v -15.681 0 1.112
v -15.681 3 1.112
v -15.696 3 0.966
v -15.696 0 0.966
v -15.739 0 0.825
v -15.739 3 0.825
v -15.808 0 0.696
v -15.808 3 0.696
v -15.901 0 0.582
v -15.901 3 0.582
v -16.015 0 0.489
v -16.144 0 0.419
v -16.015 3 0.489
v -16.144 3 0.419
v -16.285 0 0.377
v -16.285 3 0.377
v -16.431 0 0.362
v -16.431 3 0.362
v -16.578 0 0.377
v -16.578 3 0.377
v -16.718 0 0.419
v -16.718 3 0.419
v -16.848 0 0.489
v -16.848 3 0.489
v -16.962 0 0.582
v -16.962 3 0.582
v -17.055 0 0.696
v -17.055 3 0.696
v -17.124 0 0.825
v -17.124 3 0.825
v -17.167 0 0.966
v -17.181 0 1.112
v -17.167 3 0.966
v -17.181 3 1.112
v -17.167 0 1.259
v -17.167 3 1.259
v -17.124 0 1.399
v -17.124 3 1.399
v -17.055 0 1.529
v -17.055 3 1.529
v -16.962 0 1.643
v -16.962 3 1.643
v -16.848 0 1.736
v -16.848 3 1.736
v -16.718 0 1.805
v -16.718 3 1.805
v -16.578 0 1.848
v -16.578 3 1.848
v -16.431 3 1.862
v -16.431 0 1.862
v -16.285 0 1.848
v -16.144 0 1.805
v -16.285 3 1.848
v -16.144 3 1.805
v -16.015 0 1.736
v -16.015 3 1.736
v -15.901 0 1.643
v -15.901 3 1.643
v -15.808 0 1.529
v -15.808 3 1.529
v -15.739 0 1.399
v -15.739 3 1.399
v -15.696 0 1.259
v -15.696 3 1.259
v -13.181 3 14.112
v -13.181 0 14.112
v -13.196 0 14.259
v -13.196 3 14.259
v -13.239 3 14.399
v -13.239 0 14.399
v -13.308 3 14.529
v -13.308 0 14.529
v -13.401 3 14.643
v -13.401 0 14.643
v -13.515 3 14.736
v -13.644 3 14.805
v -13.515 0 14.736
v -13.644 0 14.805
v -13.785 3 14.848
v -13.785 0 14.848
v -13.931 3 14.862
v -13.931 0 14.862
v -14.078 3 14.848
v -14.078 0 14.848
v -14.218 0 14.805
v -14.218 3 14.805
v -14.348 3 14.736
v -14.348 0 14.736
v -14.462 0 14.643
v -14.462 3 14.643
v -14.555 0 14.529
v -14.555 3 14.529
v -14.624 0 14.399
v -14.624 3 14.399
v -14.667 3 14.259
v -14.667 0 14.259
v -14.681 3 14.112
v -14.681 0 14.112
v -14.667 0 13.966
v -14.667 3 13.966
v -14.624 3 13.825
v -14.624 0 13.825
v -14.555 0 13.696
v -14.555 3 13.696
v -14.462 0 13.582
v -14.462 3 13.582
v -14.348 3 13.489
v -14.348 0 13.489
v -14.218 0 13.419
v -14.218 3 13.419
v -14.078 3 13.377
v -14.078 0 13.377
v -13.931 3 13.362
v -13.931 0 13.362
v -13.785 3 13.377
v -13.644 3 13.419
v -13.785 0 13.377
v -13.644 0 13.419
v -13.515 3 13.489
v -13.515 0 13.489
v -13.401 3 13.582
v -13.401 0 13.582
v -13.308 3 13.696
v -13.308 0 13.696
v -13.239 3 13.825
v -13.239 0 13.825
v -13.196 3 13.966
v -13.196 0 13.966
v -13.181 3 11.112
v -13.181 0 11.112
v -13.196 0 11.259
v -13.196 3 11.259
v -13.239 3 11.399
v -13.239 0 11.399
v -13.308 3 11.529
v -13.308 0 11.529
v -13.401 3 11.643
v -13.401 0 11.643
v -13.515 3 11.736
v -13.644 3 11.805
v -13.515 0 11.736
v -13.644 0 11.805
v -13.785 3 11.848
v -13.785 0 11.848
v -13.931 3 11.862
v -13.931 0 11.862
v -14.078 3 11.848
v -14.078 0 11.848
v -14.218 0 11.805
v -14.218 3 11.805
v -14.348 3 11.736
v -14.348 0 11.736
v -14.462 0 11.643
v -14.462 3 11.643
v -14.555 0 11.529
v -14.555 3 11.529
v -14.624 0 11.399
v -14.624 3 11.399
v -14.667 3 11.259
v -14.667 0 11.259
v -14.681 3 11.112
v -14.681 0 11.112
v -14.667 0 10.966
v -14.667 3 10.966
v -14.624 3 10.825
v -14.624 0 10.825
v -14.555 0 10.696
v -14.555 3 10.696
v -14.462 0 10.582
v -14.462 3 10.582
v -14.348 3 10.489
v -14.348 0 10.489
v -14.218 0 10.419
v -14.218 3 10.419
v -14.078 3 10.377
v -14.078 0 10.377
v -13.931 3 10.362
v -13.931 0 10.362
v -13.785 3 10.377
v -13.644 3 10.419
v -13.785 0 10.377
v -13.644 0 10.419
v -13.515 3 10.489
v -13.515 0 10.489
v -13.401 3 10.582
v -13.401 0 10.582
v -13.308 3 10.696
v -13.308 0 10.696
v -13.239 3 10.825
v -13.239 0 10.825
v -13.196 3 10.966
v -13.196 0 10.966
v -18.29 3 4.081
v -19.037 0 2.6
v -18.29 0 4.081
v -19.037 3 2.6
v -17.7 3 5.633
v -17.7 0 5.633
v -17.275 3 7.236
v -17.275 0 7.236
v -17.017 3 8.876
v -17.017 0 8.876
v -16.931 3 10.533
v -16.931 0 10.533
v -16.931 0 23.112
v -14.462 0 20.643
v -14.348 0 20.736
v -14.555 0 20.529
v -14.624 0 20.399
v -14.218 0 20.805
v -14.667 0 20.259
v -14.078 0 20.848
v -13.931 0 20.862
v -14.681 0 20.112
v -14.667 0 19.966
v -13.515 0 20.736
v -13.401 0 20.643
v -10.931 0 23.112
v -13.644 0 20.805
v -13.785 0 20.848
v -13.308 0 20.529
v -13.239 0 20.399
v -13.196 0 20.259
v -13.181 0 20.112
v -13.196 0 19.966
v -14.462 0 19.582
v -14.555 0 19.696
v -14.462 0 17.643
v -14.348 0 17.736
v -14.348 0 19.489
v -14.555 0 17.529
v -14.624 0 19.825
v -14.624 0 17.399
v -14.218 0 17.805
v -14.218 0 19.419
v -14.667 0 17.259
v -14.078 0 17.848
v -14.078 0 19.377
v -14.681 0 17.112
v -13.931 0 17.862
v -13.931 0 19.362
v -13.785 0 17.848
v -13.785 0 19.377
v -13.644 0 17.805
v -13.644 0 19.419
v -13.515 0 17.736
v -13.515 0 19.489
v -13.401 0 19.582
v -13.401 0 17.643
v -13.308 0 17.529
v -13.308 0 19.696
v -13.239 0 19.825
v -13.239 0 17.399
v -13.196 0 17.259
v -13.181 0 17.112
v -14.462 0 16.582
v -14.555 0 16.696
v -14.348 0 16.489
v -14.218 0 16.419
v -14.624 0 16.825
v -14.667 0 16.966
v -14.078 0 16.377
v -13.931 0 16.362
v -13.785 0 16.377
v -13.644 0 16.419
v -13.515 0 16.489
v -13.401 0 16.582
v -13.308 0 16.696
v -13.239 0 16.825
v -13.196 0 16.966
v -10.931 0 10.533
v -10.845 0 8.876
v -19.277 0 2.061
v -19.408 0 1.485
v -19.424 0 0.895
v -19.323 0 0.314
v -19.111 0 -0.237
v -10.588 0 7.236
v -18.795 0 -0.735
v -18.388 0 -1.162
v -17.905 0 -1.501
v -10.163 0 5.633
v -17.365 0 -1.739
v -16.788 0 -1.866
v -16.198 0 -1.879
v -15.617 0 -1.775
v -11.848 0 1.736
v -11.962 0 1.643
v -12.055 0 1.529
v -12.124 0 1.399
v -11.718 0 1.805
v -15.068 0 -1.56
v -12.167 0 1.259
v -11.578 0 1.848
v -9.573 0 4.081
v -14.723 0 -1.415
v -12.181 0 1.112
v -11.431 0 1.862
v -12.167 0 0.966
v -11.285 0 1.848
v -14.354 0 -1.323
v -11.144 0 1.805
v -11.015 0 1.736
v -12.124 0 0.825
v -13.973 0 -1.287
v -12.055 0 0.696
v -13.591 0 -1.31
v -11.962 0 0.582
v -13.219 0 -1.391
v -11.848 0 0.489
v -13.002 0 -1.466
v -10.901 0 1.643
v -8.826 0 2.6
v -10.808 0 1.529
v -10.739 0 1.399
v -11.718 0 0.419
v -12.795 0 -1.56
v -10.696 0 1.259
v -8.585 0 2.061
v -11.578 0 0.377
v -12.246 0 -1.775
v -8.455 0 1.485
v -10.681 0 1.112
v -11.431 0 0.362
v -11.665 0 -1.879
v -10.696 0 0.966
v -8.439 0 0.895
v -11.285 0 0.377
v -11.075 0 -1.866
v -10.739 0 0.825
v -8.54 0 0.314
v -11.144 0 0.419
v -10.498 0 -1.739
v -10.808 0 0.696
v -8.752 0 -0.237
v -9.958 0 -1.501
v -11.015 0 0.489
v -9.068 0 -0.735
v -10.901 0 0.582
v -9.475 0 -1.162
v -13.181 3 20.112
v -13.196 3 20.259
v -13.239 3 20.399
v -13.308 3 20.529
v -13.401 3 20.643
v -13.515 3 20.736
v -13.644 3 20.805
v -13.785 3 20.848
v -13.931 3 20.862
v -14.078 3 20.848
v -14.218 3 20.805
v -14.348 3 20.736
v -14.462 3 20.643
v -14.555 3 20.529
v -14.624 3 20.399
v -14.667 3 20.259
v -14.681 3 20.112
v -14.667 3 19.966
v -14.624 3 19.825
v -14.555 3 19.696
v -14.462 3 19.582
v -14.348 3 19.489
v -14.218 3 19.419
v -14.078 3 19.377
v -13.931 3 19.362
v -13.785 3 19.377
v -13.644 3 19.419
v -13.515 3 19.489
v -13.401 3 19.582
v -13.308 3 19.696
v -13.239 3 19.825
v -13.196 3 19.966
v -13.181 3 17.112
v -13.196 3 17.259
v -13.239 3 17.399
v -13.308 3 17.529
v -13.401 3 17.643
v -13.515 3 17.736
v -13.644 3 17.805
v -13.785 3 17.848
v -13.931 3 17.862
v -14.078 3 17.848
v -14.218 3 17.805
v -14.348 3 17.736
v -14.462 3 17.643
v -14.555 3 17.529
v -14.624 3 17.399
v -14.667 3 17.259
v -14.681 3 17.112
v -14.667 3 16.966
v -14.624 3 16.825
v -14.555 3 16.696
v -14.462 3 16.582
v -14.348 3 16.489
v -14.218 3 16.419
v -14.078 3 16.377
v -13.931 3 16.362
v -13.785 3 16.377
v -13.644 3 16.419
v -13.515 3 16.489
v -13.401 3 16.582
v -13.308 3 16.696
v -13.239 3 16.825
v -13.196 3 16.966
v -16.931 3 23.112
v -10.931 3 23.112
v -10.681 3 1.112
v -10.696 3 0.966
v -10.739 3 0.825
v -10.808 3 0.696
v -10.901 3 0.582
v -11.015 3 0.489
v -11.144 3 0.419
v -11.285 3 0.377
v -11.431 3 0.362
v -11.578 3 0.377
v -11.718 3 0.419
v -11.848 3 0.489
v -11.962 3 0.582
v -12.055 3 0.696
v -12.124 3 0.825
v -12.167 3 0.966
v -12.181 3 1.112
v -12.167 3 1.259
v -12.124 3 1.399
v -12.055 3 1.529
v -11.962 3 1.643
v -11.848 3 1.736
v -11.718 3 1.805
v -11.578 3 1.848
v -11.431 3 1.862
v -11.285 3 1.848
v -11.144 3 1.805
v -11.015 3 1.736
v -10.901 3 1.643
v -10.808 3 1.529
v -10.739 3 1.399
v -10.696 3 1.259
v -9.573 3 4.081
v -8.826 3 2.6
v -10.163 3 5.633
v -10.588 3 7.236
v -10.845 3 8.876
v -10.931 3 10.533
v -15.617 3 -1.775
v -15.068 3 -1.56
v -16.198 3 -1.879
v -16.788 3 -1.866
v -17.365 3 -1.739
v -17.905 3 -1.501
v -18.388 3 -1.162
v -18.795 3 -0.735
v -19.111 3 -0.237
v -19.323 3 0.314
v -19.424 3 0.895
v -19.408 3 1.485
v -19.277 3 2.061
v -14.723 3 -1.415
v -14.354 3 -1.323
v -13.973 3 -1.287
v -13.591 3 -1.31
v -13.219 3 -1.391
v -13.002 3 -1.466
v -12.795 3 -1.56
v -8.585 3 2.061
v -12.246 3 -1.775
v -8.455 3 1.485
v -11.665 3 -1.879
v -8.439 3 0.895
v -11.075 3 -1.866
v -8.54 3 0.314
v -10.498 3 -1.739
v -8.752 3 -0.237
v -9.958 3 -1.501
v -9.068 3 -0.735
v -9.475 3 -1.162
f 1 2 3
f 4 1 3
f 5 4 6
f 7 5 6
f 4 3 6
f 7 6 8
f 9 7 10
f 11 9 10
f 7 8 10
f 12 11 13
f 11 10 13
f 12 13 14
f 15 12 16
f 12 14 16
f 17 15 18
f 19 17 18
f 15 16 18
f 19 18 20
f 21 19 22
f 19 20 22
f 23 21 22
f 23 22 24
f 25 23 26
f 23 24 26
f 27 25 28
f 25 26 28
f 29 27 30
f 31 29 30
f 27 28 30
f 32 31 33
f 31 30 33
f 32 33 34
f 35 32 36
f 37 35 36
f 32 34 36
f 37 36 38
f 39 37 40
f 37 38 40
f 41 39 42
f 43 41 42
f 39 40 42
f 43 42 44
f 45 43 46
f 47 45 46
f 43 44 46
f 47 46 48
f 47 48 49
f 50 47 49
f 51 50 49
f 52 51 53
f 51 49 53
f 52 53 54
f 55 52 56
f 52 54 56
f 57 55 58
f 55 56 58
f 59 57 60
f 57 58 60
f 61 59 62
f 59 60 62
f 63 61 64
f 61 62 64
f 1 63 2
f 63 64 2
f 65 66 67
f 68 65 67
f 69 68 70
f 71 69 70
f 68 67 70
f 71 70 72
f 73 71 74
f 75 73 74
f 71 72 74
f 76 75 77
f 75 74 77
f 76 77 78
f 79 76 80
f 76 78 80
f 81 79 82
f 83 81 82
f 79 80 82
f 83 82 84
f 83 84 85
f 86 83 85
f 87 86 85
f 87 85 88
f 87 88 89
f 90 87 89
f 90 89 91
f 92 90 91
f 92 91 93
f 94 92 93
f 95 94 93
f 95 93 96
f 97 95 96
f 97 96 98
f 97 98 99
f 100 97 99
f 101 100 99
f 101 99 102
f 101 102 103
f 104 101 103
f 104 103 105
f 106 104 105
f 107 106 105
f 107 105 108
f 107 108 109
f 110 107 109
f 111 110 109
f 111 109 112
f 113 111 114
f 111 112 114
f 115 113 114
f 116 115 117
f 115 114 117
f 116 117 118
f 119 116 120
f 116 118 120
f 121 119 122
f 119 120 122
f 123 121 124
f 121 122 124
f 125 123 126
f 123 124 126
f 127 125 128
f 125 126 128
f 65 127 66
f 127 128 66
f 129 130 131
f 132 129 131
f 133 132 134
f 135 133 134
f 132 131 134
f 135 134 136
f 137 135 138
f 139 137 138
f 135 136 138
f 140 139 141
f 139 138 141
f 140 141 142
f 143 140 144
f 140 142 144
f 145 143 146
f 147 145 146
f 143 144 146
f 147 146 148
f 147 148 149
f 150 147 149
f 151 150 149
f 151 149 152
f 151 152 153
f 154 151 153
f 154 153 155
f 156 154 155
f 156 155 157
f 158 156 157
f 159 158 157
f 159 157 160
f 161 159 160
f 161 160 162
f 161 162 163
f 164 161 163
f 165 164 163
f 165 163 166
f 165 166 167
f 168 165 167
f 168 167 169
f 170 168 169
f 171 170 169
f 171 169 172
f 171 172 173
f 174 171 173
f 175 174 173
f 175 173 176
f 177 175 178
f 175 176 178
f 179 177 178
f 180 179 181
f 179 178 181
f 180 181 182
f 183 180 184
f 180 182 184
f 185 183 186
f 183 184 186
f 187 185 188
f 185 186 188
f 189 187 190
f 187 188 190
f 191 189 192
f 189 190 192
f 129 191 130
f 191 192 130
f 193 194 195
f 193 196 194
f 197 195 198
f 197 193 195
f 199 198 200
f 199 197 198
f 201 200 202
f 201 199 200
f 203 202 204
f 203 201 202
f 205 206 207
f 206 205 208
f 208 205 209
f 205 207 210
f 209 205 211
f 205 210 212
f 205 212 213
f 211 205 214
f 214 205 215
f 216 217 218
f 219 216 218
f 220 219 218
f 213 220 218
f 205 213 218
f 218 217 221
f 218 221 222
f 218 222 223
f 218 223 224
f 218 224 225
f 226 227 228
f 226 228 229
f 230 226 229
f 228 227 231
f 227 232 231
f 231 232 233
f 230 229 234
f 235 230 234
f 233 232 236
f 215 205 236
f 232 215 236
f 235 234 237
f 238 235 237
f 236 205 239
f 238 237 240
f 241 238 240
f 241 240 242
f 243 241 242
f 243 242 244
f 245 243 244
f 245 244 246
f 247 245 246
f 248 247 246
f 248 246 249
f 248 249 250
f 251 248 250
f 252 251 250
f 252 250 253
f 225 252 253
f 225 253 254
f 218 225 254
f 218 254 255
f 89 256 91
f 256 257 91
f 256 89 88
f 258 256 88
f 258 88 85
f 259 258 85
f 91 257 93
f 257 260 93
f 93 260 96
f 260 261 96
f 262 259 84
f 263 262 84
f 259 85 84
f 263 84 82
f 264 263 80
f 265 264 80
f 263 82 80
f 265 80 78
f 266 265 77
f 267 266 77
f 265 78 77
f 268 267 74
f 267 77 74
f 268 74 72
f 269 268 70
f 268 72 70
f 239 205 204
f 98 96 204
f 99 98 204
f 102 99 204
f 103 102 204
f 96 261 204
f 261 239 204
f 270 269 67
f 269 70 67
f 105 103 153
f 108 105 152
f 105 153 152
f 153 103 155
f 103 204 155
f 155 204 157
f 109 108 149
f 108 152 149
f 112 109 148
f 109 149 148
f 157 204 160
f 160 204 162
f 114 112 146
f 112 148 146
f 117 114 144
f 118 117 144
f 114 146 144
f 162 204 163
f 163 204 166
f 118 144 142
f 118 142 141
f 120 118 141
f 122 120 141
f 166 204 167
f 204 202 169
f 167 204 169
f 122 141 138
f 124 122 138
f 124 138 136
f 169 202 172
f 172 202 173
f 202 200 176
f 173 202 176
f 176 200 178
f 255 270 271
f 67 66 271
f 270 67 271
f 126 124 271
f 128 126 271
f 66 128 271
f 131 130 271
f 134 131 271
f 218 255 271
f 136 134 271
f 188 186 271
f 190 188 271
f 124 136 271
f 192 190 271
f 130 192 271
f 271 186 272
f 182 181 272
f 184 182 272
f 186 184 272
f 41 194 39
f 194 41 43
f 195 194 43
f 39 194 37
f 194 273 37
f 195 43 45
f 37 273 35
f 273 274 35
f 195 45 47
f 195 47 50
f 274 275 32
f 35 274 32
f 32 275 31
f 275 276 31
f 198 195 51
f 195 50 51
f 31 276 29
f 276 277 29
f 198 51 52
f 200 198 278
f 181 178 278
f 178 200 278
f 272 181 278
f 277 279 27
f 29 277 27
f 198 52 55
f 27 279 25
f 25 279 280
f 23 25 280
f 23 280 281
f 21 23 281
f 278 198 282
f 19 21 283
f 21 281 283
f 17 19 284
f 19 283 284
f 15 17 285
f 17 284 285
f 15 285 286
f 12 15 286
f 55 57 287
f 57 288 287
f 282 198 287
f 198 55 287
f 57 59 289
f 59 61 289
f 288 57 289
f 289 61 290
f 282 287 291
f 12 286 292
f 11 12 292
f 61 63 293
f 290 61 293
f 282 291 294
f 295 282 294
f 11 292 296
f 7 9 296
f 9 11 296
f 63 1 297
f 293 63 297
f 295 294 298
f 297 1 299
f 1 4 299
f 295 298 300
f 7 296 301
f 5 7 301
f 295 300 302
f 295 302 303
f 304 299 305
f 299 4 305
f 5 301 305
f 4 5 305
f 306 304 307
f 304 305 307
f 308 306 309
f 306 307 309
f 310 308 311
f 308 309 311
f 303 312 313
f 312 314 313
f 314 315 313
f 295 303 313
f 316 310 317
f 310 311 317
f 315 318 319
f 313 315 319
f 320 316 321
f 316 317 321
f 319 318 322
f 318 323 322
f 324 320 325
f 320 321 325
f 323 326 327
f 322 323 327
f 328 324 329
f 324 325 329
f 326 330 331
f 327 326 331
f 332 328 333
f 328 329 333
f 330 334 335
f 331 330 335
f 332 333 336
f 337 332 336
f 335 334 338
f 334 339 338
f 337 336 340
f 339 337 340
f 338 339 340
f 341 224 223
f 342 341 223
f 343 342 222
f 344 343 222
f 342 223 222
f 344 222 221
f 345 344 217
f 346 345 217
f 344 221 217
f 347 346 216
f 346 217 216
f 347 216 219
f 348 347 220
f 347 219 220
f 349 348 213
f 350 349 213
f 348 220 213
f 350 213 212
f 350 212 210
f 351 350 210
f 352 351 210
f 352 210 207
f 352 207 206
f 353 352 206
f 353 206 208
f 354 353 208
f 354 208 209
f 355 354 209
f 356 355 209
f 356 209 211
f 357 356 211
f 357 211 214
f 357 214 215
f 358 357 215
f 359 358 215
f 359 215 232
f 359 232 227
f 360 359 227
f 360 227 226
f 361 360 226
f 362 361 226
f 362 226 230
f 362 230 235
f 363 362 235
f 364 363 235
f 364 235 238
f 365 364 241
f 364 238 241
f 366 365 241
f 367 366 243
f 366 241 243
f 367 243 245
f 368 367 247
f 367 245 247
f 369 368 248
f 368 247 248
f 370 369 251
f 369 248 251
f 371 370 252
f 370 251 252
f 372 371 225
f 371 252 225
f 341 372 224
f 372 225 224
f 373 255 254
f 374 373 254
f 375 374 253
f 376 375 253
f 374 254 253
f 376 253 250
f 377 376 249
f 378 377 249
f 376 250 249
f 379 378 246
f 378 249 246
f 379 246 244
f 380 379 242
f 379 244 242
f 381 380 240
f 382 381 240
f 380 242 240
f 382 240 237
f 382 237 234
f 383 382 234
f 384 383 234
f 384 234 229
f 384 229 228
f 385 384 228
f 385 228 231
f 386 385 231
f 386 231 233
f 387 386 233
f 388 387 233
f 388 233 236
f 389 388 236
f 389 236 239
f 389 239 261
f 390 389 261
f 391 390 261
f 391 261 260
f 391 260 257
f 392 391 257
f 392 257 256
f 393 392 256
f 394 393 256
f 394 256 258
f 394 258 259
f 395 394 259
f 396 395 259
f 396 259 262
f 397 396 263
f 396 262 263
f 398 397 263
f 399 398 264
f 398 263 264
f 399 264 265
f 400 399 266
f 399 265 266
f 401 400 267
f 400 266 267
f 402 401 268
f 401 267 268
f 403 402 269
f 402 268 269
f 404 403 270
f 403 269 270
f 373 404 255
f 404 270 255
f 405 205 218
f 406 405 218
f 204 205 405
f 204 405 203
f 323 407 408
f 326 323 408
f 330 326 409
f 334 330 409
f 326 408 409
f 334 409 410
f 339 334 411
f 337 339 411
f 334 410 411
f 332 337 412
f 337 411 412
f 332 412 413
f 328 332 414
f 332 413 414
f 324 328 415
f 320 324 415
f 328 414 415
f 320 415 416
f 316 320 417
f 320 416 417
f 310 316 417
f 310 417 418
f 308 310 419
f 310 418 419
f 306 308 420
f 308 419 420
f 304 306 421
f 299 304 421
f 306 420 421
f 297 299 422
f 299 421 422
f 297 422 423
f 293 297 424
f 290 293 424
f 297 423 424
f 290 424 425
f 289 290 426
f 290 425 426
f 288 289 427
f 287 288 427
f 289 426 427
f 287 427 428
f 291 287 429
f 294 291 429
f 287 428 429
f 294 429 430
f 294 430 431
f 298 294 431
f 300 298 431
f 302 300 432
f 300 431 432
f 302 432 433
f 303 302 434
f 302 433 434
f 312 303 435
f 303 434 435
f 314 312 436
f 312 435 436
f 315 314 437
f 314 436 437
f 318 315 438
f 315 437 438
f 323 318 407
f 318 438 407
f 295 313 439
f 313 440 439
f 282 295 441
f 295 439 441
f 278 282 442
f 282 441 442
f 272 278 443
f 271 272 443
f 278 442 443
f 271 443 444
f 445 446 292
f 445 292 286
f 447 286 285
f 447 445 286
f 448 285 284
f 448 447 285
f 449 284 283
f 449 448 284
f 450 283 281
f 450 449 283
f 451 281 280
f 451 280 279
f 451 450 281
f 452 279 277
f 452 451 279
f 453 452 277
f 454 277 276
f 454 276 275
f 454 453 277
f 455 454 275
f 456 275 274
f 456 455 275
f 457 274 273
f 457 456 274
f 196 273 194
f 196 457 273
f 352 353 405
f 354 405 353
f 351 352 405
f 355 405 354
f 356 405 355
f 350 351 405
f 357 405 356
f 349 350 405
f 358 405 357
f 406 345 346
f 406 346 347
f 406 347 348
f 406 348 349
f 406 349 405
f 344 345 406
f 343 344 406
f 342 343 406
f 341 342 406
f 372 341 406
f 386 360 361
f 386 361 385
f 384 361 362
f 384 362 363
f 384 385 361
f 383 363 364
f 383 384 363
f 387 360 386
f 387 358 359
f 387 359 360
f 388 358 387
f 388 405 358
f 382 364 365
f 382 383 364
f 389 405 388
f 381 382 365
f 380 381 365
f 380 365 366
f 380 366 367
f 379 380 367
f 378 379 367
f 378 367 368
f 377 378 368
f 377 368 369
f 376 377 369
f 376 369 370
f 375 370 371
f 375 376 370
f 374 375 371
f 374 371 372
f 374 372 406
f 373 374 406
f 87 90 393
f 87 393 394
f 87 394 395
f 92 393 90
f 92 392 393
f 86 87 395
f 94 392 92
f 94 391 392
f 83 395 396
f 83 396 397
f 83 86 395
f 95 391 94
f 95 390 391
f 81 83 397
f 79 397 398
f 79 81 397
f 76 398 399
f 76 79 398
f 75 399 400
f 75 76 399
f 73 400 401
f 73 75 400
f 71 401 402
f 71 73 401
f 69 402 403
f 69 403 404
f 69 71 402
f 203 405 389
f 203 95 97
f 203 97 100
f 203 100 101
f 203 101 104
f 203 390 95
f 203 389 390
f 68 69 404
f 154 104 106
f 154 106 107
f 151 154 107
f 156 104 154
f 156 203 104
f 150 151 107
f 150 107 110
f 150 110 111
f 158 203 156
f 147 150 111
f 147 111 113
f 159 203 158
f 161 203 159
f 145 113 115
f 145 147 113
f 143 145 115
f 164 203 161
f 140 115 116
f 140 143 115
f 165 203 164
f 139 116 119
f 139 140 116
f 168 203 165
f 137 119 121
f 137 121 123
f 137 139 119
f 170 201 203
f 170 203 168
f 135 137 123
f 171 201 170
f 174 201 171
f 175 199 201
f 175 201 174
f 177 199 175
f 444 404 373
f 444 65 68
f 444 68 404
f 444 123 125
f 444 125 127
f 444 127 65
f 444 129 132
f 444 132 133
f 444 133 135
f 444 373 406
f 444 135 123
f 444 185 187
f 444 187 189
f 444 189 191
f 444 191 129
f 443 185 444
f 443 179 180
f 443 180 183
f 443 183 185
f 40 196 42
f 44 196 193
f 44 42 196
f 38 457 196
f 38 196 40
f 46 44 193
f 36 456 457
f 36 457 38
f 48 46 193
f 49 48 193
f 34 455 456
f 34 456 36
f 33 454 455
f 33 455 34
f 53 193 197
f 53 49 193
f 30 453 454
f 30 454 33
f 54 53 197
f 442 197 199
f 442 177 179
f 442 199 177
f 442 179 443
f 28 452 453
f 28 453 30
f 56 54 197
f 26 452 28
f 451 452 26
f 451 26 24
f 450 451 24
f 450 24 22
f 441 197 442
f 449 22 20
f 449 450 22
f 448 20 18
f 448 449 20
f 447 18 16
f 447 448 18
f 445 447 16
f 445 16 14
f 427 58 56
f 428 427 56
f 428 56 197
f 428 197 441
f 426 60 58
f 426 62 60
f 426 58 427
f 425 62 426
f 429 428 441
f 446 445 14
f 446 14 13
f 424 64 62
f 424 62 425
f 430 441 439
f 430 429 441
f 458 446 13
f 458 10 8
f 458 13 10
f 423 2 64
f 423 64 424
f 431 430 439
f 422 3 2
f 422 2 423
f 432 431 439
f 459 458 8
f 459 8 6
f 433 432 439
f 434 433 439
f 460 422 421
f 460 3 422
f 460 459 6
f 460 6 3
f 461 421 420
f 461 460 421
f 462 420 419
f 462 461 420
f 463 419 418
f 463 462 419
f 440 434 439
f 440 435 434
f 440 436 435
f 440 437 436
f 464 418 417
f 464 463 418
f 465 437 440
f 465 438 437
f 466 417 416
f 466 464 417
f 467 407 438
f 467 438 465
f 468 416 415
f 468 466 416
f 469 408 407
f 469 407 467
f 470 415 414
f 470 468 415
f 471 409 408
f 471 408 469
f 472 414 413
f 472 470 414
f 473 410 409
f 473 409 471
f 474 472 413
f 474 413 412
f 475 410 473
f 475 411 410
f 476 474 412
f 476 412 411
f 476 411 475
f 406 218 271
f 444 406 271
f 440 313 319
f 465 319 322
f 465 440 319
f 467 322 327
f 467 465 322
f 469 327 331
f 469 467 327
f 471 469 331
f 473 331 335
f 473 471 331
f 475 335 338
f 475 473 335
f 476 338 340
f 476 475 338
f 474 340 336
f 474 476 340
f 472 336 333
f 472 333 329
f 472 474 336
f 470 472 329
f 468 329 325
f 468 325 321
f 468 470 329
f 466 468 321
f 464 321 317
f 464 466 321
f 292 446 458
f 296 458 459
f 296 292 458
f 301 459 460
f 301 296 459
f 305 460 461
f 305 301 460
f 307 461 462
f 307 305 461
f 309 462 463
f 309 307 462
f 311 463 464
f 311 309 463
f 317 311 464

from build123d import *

# Parameters (mm, degrees)
CROQUIS2_W              = 6
CROQUIS2_H              = 22
SALIENTE_EXTRUIR2_DEPTH = 3
CROQUIS7_R              = 3
SALIENTE_EXTRUIR4_DEPTH = 3
REDONDEO2_R             = 2.5
CROQUIS11_R             = 0.75
CORTAR_EXTRUIR6_DEPTH   = 3
CROQUIS12_R             = 0.75
CORTAR_EXTRUIR7_DEPTH   = 10
REDONDEO3_R             = 16


with BuildPart() as part:
    # Croquis2 → Saliente-Extruir2 (new body)
    with BuildSketch(Plane(origin=(0, 0, 0), x_dir=(1, 0, 0), z_dir=(0, 1, 0))):
        with Locations((-13.931432693, -12.112220068)):
            Rectangle(CROQUIS2_W, CROQUIS2_H)
    extrude(amount=SALIENTE_EXTRUIR2_DEPTH)

    # Croquis7 → Saliente-Extruir4 (add)
    with BuildSketch(Plane(origin=(0, 3, 0), x_dir=(1, 0, 0), z_dir=(0, 1, 0))):
        with Locations((-16.431432693, -1.112220068)):
            Circle(CROQUIS7_R)
        with Locations((-11.431432693, -1.112220068)):
            Circle(CROQUIS7_R)
    extrude(amount=-SALIENTE_EXTRUIR4_DEPTH)

    # Redondeo2
    redondeo2_edges = [part.edges().sort_by_distance(p)[0] for p in [
        (-13.931432693, 1.5, -0.546092328),
    ]]
    fillet(redondeo2_edges, radius=REDONDEO2_R)

    # Croquis11 → Cortar-Extruir6 (cut)
    with BuildSketch(Plane(origin=(0, 3, 0), x_dir=(1, 0, 0), z_dir=(0, 1, 0))):
        with Locations((-16.431432693, -1.112220068)):
            Circle(CROQUIS11_R)
        with Locations((-11.431432693, -1.112220068)):
            Circle(CROQUIS11_R)
    extrude(amount=-CORTAR_EXTRUIR6_DEPTH, mode=Mode.SUBTRACT)

    # Croquis12 → Cortar-Extruir7 (cut)
    with BuildSketch(Plane.XZ):
        with Locations((-13.931432693, 20.112220068)):
            Circle(CROQUIS12_R)
        with Locations((-13.931432693, 17.112220068)):
            Circle(CROQUIS12_R)
        with Locations((-13.931432693, 14.112220068)):
            Circle(CROQUIS12_R)
        with Locations((-13.931432693, 11.112220068)):
            Circle(CROQUIS12_R)
    extrude(amount=-CORTAR_EXTRUIR7_DEPTH, mode=Mode.SUBTRACT)

    # Redondeo3
    redondeo3_edges = [part.edges().sort_by_distance(p)[0] for p in [
        (-10.931432693, 1.5, 4.070259959),
        (-16.931432693, 1.5, 4.070259959),
    ]]
    fillet(redondeo3_edges, radius=REDONDEO3_R)


solid = part.part
